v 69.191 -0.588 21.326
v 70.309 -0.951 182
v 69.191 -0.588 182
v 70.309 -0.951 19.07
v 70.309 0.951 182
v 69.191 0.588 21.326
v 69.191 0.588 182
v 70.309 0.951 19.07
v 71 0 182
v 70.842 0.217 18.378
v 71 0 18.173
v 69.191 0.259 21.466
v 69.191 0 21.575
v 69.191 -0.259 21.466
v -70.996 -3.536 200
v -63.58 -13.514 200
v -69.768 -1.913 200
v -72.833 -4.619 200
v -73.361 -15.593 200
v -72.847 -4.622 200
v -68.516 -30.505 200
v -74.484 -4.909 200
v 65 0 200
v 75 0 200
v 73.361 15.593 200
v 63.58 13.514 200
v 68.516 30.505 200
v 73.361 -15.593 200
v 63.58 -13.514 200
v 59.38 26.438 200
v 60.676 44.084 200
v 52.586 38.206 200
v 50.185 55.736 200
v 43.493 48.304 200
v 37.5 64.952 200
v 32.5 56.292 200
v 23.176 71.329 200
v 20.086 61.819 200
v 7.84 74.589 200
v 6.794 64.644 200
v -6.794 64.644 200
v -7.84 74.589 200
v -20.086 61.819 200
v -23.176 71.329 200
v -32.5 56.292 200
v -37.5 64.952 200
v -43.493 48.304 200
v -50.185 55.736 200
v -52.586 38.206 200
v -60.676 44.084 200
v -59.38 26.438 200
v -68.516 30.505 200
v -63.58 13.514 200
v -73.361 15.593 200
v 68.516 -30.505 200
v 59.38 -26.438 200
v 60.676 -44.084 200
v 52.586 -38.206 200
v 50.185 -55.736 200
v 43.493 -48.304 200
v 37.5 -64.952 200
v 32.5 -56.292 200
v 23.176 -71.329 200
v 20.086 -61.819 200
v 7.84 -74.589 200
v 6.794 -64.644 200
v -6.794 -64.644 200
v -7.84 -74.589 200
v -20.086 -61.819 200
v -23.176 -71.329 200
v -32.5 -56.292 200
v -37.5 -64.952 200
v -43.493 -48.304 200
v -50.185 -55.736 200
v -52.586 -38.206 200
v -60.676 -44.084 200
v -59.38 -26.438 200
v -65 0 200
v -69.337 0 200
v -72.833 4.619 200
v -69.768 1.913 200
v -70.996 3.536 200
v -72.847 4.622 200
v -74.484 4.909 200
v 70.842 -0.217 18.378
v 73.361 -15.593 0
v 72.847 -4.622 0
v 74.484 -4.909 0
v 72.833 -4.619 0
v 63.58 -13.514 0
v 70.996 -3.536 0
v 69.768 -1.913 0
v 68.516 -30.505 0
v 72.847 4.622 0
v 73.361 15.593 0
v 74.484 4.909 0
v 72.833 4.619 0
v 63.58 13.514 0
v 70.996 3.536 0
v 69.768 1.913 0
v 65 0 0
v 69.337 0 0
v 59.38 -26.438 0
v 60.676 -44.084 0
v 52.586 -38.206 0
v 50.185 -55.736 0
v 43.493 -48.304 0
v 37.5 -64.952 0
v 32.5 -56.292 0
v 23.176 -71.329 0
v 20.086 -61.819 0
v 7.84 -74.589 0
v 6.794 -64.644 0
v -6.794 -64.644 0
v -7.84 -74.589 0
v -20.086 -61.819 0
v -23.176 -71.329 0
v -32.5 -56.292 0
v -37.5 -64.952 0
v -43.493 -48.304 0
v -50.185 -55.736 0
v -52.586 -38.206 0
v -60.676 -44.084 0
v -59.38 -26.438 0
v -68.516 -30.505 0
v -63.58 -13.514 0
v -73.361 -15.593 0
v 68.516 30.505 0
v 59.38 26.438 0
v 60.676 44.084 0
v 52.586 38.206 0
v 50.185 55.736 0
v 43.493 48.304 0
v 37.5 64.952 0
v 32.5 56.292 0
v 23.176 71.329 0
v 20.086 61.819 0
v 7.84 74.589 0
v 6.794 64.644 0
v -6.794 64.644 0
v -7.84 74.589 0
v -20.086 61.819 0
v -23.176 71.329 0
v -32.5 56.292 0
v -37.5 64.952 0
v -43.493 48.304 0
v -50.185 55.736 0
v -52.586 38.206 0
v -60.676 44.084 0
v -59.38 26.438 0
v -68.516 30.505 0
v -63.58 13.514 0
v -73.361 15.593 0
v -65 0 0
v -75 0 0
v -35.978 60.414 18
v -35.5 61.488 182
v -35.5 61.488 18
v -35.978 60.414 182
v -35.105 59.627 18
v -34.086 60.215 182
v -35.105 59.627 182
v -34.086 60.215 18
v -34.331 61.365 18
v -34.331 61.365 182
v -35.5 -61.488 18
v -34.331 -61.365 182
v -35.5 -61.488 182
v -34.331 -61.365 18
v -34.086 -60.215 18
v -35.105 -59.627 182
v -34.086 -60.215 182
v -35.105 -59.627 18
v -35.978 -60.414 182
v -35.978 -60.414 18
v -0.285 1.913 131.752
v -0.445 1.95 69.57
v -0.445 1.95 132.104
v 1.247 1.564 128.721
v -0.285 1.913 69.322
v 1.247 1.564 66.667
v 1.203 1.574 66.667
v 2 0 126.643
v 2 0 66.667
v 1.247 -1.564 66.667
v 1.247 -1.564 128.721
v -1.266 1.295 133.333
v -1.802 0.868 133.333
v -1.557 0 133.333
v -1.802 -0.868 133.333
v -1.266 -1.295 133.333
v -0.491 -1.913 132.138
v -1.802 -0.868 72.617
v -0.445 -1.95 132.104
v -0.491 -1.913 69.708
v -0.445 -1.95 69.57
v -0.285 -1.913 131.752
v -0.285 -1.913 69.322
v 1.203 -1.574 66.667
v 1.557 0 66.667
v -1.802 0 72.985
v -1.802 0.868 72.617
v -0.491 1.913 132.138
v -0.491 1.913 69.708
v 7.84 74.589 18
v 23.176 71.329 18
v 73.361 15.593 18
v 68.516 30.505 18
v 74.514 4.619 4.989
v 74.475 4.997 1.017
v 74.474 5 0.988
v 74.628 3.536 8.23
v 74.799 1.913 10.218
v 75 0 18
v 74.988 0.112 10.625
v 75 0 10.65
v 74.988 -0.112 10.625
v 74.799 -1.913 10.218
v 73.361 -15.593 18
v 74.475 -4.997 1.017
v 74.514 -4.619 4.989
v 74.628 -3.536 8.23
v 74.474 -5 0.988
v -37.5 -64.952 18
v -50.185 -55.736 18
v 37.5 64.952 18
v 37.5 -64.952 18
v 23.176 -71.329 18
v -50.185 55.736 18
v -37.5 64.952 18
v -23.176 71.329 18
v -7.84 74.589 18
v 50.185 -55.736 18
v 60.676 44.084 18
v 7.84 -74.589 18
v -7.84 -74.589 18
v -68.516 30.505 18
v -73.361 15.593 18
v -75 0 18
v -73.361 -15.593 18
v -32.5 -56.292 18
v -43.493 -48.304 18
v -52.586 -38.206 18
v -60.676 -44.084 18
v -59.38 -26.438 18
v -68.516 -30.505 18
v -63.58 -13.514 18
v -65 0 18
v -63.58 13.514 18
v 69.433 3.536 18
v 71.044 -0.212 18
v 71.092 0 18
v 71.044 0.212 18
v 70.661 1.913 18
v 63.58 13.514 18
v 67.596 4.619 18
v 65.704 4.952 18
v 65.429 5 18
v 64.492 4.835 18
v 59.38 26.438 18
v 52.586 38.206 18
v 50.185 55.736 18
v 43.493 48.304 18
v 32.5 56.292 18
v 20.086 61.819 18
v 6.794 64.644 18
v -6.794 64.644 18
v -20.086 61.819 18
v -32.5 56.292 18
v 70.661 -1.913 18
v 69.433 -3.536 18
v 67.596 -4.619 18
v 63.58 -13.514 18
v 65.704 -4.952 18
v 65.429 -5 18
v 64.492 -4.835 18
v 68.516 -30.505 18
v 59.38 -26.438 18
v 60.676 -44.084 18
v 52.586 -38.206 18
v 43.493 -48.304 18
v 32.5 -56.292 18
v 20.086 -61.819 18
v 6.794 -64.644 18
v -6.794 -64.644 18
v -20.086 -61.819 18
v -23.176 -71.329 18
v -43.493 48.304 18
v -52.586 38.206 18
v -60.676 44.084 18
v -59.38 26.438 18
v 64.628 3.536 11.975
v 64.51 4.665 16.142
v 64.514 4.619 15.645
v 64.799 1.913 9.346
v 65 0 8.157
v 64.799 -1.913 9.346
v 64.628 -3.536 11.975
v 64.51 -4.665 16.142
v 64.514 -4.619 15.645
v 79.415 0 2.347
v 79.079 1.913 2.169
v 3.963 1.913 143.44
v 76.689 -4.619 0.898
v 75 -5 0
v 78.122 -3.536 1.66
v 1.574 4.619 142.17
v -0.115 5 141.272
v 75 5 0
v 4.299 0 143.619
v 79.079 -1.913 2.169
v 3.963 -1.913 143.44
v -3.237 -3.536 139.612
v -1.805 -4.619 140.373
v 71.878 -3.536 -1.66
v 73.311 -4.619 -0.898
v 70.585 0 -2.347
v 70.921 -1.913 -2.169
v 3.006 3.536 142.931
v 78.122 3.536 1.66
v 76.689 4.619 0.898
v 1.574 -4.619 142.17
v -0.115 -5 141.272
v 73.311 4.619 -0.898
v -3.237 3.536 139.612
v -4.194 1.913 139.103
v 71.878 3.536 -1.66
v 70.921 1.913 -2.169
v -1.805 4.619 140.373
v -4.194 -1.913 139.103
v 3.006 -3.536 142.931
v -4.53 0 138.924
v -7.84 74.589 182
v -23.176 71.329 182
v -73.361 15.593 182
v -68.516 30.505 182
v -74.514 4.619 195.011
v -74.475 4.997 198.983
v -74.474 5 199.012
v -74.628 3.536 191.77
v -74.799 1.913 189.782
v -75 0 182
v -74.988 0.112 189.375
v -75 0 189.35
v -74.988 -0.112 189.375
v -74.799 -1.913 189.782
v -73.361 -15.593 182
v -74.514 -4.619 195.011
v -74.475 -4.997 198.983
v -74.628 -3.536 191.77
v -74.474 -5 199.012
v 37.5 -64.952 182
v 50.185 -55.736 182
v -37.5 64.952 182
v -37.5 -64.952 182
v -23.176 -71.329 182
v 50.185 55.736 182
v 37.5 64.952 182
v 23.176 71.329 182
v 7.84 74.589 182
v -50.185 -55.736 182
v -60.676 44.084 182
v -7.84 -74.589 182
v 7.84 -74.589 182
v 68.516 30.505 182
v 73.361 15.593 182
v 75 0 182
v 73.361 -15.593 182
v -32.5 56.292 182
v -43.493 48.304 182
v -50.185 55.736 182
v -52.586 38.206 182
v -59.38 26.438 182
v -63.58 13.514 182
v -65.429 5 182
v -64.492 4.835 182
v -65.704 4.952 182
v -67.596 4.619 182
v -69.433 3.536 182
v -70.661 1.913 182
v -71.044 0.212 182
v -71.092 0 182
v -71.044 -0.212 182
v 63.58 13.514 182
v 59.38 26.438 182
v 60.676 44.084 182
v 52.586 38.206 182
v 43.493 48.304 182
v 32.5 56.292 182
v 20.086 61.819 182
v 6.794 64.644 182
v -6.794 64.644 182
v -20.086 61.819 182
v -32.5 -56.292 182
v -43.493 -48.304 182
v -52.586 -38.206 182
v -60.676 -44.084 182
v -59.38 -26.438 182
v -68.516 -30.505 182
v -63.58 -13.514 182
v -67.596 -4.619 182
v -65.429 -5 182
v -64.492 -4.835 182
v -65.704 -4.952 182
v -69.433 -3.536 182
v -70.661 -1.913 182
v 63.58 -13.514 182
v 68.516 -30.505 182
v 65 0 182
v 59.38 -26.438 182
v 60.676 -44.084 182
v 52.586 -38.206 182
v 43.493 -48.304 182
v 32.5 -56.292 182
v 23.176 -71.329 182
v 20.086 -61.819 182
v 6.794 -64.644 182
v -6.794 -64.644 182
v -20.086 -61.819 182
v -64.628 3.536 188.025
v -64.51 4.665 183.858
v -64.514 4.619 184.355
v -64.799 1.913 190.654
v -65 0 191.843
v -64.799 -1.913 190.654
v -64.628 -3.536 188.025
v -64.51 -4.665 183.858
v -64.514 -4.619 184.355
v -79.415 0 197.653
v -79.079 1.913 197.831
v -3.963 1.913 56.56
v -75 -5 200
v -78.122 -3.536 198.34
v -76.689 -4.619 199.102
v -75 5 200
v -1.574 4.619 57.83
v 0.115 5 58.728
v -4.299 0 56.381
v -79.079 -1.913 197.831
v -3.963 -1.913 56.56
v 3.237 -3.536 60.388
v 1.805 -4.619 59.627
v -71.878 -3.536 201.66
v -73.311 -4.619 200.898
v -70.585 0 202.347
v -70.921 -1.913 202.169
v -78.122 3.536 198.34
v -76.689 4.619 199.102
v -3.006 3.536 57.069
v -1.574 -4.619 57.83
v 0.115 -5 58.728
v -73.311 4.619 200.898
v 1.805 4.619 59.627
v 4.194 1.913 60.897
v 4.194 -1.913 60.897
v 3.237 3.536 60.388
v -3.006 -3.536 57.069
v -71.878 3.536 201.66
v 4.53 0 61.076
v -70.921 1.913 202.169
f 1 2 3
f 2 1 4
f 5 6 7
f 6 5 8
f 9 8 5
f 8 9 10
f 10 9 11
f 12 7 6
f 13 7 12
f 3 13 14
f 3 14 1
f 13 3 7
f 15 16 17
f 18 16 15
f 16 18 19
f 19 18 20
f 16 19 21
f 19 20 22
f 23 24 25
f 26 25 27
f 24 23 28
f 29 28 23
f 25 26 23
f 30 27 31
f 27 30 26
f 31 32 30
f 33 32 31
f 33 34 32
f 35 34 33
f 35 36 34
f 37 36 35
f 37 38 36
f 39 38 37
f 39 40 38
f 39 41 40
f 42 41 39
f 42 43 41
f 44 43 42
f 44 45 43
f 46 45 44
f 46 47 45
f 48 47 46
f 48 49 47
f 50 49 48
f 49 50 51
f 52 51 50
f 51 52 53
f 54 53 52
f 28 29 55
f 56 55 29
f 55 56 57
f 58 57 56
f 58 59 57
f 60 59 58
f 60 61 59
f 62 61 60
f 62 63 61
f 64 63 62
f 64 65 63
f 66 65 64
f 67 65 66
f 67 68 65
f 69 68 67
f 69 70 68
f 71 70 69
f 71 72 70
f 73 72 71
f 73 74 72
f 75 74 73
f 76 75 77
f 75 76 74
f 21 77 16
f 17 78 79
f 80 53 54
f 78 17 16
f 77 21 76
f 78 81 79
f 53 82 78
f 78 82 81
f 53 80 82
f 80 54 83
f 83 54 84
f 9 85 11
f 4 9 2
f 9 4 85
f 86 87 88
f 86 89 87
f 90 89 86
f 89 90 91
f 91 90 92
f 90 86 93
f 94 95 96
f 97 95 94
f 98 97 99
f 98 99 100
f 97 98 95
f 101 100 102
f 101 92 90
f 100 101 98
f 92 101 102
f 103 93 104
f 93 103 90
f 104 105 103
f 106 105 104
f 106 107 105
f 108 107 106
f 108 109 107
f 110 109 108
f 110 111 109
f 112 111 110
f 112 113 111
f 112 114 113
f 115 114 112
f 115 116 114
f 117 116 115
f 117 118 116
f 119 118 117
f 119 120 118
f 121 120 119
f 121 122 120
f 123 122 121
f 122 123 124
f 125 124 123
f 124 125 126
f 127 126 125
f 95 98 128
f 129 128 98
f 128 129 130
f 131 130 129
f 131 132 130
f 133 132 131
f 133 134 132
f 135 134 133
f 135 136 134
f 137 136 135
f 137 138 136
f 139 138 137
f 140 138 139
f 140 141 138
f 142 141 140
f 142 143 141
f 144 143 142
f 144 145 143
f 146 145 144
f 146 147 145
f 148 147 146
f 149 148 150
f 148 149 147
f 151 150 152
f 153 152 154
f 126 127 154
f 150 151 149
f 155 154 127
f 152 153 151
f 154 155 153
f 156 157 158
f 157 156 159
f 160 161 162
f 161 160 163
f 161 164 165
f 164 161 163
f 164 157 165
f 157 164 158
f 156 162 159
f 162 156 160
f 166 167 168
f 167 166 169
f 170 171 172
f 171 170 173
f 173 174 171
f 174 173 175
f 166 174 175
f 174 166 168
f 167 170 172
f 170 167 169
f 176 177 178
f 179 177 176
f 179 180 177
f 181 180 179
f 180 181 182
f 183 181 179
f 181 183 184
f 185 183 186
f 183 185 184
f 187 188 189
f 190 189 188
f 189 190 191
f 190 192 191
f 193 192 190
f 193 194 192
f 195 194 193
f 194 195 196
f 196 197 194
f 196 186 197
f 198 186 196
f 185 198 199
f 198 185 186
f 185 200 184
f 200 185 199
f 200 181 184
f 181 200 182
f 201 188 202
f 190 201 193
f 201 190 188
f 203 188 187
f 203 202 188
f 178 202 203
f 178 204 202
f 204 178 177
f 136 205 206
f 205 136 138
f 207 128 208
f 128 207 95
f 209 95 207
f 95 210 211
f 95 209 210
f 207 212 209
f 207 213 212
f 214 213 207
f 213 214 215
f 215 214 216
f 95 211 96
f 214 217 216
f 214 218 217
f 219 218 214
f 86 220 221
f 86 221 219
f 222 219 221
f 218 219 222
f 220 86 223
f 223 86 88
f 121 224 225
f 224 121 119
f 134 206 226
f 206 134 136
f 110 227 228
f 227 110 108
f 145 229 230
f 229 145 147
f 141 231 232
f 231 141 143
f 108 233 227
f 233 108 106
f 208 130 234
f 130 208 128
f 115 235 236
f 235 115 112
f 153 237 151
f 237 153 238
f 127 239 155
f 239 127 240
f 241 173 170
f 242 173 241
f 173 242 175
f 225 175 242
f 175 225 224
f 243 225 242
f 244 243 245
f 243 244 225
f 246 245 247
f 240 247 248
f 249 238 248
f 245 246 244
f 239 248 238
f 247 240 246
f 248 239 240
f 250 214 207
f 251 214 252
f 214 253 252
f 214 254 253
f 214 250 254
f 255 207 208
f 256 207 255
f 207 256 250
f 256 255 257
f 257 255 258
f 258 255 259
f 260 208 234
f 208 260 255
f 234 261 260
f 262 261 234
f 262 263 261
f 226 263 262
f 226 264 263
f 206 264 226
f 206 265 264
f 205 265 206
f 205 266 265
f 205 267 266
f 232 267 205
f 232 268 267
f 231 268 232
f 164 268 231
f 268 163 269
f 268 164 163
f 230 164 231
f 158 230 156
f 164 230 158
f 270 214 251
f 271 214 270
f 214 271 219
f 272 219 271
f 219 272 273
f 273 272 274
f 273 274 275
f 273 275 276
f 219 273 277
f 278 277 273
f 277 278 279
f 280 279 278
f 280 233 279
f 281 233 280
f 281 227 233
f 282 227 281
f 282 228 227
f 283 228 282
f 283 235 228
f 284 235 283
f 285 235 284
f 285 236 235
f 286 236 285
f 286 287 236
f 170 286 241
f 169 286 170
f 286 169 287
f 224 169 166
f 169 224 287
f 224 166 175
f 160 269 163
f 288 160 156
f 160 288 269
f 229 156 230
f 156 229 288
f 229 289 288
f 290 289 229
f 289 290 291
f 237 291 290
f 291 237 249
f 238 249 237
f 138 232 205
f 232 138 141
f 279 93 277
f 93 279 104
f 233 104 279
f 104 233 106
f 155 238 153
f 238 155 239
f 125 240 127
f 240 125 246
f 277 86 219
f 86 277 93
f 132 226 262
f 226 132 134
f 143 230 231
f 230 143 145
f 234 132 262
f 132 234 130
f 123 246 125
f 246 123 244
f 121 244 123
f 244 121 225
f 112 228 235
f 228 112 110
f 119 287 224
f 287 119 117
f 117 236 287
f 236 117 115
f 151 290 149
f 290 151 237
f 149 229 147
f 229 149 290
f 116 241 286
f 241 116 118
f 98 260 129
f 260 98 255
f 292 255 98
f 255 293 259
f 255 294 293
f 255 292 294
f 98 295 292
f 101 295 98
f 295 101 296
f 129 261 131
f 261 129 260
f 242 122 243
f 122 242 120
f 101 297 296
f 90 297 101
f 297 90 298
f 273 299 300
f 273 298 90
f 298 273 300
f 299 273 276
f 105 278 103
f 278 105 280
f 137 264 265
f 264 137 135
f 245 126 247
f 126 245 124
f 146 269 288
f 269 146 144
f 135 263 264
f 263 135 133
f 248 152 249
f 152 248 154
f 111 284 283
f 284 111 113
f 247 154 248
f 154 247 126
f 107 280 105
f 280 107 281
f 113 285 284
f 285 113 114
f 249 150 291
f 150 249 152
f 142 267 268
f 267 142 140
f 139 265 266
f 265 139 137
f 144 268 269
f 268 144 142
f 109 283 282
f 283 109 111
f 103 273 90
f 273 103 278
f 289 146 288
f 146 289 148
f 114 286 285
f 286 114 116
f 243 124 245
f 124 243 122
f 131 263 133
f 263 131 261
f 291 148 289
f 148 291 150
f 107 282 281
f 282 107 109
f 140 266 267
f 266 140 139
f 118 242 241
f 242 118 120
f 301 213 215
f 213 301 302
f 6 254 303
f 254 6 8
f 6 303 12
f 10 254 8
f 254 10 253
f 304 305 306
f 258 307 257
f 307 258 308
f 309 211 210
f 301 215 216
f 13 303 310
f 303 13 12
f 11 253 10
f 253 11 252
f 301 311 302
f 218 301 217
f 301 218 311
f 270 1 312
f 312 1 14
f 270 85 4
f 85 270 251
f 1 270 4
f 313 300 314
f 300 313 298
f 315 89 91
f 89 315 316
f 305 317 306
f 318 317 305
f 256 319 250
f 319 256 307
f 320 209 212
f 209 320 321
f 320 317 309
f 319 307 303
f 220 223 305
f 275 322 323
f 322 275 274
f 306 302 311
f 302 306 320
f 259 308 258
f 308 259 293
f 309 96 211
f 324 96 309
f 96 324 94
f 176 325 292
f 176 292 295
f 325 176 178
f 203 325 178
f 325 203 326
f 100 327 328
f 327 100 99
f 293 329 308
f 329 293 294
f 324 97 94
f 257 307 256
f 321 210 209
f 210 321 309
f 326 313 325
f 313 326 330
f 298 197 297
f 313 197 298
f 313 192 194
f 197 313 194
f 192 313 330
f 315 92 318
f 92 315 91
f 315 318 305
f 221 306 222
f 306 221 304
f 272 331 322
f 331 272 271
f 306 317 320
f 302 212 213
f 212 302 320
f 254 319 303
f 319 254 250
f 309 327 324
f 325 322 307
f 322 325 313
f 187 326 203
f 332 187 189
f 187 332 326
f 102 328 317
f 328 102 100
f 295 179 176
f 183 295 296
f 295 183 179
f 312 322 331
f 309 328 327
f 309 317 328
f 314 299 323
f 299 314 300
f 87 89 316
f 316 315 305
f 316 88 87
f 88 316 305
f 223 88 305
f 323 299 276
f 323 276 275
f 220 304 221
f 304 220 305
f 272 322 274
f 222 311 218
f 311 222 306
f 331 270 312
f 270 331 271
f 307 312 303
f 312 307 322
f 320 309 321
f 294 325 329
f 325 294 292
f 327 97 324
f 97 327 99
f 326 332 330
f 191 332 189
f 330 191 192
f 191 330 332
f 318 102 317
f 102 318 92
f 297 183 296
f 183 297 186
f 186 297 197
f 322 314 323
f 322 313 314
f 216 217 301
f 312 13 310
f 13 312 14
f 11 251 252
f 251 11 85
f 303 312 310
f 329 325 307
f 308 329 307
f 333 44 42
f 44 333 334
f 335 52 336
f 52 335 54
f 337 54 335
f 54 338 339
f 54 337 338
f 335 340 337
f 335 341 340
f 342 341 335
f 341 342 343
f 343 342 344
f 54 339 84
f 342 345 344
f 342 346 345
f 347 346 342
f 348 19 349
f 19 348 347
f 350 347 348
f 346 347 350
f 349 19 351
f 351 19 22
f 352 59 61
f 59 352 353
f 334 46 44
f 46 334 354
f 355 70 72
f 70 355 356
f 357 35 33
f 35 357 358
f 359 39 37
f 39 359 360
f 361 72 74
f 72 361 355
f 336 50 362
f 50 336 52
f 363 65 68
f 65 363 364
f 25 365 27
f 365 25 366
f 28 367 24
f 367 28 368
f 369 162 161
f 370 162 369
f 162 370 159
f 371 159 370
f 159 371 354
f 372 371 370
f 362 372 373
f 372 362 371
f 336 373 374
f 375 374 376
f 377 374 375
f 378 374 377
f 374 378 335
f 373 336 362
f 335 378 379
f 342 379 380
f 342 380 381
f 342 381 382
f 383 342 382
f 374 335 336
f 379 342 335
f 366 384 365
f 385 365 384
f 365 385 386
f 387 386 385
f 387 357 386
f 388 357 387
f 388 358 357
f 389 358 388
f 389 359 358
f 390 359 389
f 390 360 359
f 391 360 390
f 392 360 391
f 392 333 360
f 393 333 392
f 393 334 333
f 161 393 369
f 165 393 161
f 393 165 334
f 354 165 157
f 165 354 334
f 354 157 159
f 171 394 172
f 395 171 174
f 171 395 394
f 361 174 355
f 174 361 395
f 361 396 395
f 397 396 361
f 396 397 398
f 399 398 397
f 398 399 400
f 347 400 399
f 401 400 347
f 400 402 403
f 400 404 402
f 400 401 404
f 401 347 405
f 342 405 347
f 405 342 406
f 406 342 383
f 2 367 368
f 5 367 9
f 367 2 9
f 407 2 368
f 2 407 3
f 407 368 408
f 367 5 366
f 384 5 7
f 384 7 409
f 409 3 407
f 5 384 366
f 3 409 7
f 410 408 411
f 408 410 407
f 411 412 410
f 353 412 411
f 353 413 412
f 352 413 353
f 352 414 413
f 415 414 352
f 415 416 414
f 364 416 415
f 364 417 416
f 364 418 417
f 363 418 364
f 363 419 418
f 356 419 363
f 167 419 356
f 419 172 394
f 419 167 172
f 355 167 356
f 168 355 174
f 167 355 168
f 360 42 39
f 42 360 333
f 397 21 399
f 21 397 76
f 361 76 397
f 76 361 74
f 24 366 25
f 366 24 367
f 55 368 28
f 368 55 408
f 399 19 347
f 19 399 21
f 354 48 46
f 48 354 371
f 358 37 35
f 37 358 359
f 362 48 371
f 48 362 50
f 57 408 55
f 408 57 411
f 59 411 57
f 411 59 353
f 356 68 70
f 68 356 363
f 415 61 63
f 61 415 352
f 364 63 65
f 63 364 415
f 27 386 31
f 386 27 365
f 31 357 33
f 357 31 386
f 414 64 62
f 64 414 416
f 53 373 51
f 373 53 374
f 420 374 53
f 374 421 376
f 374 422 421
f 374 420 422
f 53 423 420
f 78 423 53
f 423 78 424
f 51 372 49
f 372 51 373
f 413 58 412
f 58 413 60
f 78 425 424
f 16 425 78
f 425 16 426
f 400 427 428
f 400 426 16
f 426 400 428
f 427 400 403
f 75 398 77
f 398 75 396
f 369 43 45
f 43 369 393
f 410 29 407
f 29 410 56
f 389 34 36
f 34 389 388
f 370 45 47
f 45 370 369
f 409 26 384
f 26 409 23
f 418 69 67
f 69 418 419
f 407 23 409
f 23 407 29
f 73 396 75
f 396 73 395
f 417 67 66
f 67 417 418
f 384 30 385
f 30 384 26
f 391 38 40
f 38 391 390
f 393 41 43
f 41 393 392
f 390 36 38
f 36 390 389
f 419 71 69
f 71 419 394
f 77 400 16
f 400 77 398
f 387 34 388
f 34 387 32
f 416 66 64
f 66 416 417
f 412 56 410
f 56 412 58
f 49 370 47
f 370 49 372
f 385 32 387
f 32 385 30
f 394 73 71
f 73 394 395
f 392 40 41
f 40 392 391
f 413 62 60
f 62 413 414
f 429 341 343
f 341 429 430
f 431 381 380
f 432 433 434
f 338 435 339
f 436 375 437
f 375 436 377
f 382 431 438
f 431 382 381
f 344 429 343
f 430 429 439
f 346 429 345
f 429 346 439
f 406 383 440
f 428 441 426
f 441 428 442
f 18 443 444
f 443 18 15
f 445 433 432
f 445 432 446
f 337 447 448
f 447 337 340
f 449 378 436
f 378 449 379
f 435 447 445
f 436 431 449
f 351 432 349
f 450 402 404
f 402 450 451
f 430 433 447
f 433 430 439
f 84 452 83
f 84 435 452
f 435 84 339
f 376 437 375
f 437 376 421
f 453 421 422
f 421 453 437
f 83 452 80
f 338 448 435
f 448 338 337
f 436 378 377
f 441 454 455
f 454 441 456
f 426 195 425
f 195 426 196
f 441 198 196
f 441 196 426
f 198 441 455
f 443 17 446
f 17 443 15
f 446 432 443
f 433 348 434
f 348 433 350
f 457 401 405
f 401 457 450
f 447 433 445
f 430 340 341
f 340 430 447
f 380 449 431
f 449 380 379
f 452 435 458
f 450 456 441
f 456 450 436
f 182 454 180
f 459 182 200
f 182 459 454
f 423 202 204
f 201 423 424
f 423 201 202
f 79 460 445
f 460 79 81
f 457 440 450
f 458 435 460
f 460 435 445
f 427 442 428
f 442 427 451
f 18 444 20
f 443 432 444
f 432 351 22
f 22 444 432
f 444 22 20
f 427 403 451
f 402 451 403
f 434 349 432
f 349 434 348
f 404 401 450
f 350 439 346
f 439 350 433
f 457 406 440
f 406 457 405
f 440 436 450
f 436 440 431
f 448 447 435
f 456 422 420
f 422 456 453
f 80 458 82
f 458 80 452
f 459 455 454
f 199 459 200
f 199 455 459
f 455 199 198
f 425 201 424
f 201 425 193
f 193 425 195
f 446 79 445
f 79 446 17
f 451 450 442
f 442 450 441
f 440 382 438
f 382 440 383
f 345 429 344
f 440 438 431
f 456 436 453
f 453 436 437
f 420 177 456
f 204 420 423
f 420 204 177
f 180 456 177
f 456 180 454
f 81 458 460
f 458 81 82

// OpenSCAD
mat_t = 18;

circle_t = 20;
circle_outer_d = 150;

height = 200;

module arm_v1(){
    support_h = (2/3)*height;
    
    translate([(circle_outer_d/2),0,0]){
        cylinder(h=support_h, d=circle_t/2);
    }
    
    translate([0,0,support_h]){
        rotate([0,90,0]){
            cylinder(h=circle_outer_d/2, d=circle_t/2);
        }
    }
}

module arm_v2(){
    support_h = (2/3)*height;
    
    translate([circle_outer_d/2, 0, 0]){
        rotate([0, -28, 0]){
            cylinder(h=height*(4/5), d=circle_t/2);
        }
    }
}

module support(a) {
    rotate([0, 0, a]) {
        translate([circle_outer_d/2-circle_t/4, 0, 0]){
            cylinder(h=height, d=2);
        }
    }
}

module main_support() {
    main_support_h = height*(1/3);
    
    translate([0, 0, height/2-main_support_h/2]){
        cylinder(h=main_support_h, d=4);
    }
}

module ring(){
    difference(){
        cylinder(h=mat_t, d=circle_outer_d);
        
        translate([0,0,-1]){
            cylinder(h=mat_t+2, d=circle_outer_d-circle_t);
        }
    }
    
    arm_v2();
}

// Supports
color("LightGrey"){
    support(0);
    support(360/3);
    support(360*(2/3));
        
    main_support();
}



// Floating rings
color("Chocolate"){
    ring();

    translate([0,0,height]){
        rotate([0,180,0]){
            ring();
        }
    }
}
